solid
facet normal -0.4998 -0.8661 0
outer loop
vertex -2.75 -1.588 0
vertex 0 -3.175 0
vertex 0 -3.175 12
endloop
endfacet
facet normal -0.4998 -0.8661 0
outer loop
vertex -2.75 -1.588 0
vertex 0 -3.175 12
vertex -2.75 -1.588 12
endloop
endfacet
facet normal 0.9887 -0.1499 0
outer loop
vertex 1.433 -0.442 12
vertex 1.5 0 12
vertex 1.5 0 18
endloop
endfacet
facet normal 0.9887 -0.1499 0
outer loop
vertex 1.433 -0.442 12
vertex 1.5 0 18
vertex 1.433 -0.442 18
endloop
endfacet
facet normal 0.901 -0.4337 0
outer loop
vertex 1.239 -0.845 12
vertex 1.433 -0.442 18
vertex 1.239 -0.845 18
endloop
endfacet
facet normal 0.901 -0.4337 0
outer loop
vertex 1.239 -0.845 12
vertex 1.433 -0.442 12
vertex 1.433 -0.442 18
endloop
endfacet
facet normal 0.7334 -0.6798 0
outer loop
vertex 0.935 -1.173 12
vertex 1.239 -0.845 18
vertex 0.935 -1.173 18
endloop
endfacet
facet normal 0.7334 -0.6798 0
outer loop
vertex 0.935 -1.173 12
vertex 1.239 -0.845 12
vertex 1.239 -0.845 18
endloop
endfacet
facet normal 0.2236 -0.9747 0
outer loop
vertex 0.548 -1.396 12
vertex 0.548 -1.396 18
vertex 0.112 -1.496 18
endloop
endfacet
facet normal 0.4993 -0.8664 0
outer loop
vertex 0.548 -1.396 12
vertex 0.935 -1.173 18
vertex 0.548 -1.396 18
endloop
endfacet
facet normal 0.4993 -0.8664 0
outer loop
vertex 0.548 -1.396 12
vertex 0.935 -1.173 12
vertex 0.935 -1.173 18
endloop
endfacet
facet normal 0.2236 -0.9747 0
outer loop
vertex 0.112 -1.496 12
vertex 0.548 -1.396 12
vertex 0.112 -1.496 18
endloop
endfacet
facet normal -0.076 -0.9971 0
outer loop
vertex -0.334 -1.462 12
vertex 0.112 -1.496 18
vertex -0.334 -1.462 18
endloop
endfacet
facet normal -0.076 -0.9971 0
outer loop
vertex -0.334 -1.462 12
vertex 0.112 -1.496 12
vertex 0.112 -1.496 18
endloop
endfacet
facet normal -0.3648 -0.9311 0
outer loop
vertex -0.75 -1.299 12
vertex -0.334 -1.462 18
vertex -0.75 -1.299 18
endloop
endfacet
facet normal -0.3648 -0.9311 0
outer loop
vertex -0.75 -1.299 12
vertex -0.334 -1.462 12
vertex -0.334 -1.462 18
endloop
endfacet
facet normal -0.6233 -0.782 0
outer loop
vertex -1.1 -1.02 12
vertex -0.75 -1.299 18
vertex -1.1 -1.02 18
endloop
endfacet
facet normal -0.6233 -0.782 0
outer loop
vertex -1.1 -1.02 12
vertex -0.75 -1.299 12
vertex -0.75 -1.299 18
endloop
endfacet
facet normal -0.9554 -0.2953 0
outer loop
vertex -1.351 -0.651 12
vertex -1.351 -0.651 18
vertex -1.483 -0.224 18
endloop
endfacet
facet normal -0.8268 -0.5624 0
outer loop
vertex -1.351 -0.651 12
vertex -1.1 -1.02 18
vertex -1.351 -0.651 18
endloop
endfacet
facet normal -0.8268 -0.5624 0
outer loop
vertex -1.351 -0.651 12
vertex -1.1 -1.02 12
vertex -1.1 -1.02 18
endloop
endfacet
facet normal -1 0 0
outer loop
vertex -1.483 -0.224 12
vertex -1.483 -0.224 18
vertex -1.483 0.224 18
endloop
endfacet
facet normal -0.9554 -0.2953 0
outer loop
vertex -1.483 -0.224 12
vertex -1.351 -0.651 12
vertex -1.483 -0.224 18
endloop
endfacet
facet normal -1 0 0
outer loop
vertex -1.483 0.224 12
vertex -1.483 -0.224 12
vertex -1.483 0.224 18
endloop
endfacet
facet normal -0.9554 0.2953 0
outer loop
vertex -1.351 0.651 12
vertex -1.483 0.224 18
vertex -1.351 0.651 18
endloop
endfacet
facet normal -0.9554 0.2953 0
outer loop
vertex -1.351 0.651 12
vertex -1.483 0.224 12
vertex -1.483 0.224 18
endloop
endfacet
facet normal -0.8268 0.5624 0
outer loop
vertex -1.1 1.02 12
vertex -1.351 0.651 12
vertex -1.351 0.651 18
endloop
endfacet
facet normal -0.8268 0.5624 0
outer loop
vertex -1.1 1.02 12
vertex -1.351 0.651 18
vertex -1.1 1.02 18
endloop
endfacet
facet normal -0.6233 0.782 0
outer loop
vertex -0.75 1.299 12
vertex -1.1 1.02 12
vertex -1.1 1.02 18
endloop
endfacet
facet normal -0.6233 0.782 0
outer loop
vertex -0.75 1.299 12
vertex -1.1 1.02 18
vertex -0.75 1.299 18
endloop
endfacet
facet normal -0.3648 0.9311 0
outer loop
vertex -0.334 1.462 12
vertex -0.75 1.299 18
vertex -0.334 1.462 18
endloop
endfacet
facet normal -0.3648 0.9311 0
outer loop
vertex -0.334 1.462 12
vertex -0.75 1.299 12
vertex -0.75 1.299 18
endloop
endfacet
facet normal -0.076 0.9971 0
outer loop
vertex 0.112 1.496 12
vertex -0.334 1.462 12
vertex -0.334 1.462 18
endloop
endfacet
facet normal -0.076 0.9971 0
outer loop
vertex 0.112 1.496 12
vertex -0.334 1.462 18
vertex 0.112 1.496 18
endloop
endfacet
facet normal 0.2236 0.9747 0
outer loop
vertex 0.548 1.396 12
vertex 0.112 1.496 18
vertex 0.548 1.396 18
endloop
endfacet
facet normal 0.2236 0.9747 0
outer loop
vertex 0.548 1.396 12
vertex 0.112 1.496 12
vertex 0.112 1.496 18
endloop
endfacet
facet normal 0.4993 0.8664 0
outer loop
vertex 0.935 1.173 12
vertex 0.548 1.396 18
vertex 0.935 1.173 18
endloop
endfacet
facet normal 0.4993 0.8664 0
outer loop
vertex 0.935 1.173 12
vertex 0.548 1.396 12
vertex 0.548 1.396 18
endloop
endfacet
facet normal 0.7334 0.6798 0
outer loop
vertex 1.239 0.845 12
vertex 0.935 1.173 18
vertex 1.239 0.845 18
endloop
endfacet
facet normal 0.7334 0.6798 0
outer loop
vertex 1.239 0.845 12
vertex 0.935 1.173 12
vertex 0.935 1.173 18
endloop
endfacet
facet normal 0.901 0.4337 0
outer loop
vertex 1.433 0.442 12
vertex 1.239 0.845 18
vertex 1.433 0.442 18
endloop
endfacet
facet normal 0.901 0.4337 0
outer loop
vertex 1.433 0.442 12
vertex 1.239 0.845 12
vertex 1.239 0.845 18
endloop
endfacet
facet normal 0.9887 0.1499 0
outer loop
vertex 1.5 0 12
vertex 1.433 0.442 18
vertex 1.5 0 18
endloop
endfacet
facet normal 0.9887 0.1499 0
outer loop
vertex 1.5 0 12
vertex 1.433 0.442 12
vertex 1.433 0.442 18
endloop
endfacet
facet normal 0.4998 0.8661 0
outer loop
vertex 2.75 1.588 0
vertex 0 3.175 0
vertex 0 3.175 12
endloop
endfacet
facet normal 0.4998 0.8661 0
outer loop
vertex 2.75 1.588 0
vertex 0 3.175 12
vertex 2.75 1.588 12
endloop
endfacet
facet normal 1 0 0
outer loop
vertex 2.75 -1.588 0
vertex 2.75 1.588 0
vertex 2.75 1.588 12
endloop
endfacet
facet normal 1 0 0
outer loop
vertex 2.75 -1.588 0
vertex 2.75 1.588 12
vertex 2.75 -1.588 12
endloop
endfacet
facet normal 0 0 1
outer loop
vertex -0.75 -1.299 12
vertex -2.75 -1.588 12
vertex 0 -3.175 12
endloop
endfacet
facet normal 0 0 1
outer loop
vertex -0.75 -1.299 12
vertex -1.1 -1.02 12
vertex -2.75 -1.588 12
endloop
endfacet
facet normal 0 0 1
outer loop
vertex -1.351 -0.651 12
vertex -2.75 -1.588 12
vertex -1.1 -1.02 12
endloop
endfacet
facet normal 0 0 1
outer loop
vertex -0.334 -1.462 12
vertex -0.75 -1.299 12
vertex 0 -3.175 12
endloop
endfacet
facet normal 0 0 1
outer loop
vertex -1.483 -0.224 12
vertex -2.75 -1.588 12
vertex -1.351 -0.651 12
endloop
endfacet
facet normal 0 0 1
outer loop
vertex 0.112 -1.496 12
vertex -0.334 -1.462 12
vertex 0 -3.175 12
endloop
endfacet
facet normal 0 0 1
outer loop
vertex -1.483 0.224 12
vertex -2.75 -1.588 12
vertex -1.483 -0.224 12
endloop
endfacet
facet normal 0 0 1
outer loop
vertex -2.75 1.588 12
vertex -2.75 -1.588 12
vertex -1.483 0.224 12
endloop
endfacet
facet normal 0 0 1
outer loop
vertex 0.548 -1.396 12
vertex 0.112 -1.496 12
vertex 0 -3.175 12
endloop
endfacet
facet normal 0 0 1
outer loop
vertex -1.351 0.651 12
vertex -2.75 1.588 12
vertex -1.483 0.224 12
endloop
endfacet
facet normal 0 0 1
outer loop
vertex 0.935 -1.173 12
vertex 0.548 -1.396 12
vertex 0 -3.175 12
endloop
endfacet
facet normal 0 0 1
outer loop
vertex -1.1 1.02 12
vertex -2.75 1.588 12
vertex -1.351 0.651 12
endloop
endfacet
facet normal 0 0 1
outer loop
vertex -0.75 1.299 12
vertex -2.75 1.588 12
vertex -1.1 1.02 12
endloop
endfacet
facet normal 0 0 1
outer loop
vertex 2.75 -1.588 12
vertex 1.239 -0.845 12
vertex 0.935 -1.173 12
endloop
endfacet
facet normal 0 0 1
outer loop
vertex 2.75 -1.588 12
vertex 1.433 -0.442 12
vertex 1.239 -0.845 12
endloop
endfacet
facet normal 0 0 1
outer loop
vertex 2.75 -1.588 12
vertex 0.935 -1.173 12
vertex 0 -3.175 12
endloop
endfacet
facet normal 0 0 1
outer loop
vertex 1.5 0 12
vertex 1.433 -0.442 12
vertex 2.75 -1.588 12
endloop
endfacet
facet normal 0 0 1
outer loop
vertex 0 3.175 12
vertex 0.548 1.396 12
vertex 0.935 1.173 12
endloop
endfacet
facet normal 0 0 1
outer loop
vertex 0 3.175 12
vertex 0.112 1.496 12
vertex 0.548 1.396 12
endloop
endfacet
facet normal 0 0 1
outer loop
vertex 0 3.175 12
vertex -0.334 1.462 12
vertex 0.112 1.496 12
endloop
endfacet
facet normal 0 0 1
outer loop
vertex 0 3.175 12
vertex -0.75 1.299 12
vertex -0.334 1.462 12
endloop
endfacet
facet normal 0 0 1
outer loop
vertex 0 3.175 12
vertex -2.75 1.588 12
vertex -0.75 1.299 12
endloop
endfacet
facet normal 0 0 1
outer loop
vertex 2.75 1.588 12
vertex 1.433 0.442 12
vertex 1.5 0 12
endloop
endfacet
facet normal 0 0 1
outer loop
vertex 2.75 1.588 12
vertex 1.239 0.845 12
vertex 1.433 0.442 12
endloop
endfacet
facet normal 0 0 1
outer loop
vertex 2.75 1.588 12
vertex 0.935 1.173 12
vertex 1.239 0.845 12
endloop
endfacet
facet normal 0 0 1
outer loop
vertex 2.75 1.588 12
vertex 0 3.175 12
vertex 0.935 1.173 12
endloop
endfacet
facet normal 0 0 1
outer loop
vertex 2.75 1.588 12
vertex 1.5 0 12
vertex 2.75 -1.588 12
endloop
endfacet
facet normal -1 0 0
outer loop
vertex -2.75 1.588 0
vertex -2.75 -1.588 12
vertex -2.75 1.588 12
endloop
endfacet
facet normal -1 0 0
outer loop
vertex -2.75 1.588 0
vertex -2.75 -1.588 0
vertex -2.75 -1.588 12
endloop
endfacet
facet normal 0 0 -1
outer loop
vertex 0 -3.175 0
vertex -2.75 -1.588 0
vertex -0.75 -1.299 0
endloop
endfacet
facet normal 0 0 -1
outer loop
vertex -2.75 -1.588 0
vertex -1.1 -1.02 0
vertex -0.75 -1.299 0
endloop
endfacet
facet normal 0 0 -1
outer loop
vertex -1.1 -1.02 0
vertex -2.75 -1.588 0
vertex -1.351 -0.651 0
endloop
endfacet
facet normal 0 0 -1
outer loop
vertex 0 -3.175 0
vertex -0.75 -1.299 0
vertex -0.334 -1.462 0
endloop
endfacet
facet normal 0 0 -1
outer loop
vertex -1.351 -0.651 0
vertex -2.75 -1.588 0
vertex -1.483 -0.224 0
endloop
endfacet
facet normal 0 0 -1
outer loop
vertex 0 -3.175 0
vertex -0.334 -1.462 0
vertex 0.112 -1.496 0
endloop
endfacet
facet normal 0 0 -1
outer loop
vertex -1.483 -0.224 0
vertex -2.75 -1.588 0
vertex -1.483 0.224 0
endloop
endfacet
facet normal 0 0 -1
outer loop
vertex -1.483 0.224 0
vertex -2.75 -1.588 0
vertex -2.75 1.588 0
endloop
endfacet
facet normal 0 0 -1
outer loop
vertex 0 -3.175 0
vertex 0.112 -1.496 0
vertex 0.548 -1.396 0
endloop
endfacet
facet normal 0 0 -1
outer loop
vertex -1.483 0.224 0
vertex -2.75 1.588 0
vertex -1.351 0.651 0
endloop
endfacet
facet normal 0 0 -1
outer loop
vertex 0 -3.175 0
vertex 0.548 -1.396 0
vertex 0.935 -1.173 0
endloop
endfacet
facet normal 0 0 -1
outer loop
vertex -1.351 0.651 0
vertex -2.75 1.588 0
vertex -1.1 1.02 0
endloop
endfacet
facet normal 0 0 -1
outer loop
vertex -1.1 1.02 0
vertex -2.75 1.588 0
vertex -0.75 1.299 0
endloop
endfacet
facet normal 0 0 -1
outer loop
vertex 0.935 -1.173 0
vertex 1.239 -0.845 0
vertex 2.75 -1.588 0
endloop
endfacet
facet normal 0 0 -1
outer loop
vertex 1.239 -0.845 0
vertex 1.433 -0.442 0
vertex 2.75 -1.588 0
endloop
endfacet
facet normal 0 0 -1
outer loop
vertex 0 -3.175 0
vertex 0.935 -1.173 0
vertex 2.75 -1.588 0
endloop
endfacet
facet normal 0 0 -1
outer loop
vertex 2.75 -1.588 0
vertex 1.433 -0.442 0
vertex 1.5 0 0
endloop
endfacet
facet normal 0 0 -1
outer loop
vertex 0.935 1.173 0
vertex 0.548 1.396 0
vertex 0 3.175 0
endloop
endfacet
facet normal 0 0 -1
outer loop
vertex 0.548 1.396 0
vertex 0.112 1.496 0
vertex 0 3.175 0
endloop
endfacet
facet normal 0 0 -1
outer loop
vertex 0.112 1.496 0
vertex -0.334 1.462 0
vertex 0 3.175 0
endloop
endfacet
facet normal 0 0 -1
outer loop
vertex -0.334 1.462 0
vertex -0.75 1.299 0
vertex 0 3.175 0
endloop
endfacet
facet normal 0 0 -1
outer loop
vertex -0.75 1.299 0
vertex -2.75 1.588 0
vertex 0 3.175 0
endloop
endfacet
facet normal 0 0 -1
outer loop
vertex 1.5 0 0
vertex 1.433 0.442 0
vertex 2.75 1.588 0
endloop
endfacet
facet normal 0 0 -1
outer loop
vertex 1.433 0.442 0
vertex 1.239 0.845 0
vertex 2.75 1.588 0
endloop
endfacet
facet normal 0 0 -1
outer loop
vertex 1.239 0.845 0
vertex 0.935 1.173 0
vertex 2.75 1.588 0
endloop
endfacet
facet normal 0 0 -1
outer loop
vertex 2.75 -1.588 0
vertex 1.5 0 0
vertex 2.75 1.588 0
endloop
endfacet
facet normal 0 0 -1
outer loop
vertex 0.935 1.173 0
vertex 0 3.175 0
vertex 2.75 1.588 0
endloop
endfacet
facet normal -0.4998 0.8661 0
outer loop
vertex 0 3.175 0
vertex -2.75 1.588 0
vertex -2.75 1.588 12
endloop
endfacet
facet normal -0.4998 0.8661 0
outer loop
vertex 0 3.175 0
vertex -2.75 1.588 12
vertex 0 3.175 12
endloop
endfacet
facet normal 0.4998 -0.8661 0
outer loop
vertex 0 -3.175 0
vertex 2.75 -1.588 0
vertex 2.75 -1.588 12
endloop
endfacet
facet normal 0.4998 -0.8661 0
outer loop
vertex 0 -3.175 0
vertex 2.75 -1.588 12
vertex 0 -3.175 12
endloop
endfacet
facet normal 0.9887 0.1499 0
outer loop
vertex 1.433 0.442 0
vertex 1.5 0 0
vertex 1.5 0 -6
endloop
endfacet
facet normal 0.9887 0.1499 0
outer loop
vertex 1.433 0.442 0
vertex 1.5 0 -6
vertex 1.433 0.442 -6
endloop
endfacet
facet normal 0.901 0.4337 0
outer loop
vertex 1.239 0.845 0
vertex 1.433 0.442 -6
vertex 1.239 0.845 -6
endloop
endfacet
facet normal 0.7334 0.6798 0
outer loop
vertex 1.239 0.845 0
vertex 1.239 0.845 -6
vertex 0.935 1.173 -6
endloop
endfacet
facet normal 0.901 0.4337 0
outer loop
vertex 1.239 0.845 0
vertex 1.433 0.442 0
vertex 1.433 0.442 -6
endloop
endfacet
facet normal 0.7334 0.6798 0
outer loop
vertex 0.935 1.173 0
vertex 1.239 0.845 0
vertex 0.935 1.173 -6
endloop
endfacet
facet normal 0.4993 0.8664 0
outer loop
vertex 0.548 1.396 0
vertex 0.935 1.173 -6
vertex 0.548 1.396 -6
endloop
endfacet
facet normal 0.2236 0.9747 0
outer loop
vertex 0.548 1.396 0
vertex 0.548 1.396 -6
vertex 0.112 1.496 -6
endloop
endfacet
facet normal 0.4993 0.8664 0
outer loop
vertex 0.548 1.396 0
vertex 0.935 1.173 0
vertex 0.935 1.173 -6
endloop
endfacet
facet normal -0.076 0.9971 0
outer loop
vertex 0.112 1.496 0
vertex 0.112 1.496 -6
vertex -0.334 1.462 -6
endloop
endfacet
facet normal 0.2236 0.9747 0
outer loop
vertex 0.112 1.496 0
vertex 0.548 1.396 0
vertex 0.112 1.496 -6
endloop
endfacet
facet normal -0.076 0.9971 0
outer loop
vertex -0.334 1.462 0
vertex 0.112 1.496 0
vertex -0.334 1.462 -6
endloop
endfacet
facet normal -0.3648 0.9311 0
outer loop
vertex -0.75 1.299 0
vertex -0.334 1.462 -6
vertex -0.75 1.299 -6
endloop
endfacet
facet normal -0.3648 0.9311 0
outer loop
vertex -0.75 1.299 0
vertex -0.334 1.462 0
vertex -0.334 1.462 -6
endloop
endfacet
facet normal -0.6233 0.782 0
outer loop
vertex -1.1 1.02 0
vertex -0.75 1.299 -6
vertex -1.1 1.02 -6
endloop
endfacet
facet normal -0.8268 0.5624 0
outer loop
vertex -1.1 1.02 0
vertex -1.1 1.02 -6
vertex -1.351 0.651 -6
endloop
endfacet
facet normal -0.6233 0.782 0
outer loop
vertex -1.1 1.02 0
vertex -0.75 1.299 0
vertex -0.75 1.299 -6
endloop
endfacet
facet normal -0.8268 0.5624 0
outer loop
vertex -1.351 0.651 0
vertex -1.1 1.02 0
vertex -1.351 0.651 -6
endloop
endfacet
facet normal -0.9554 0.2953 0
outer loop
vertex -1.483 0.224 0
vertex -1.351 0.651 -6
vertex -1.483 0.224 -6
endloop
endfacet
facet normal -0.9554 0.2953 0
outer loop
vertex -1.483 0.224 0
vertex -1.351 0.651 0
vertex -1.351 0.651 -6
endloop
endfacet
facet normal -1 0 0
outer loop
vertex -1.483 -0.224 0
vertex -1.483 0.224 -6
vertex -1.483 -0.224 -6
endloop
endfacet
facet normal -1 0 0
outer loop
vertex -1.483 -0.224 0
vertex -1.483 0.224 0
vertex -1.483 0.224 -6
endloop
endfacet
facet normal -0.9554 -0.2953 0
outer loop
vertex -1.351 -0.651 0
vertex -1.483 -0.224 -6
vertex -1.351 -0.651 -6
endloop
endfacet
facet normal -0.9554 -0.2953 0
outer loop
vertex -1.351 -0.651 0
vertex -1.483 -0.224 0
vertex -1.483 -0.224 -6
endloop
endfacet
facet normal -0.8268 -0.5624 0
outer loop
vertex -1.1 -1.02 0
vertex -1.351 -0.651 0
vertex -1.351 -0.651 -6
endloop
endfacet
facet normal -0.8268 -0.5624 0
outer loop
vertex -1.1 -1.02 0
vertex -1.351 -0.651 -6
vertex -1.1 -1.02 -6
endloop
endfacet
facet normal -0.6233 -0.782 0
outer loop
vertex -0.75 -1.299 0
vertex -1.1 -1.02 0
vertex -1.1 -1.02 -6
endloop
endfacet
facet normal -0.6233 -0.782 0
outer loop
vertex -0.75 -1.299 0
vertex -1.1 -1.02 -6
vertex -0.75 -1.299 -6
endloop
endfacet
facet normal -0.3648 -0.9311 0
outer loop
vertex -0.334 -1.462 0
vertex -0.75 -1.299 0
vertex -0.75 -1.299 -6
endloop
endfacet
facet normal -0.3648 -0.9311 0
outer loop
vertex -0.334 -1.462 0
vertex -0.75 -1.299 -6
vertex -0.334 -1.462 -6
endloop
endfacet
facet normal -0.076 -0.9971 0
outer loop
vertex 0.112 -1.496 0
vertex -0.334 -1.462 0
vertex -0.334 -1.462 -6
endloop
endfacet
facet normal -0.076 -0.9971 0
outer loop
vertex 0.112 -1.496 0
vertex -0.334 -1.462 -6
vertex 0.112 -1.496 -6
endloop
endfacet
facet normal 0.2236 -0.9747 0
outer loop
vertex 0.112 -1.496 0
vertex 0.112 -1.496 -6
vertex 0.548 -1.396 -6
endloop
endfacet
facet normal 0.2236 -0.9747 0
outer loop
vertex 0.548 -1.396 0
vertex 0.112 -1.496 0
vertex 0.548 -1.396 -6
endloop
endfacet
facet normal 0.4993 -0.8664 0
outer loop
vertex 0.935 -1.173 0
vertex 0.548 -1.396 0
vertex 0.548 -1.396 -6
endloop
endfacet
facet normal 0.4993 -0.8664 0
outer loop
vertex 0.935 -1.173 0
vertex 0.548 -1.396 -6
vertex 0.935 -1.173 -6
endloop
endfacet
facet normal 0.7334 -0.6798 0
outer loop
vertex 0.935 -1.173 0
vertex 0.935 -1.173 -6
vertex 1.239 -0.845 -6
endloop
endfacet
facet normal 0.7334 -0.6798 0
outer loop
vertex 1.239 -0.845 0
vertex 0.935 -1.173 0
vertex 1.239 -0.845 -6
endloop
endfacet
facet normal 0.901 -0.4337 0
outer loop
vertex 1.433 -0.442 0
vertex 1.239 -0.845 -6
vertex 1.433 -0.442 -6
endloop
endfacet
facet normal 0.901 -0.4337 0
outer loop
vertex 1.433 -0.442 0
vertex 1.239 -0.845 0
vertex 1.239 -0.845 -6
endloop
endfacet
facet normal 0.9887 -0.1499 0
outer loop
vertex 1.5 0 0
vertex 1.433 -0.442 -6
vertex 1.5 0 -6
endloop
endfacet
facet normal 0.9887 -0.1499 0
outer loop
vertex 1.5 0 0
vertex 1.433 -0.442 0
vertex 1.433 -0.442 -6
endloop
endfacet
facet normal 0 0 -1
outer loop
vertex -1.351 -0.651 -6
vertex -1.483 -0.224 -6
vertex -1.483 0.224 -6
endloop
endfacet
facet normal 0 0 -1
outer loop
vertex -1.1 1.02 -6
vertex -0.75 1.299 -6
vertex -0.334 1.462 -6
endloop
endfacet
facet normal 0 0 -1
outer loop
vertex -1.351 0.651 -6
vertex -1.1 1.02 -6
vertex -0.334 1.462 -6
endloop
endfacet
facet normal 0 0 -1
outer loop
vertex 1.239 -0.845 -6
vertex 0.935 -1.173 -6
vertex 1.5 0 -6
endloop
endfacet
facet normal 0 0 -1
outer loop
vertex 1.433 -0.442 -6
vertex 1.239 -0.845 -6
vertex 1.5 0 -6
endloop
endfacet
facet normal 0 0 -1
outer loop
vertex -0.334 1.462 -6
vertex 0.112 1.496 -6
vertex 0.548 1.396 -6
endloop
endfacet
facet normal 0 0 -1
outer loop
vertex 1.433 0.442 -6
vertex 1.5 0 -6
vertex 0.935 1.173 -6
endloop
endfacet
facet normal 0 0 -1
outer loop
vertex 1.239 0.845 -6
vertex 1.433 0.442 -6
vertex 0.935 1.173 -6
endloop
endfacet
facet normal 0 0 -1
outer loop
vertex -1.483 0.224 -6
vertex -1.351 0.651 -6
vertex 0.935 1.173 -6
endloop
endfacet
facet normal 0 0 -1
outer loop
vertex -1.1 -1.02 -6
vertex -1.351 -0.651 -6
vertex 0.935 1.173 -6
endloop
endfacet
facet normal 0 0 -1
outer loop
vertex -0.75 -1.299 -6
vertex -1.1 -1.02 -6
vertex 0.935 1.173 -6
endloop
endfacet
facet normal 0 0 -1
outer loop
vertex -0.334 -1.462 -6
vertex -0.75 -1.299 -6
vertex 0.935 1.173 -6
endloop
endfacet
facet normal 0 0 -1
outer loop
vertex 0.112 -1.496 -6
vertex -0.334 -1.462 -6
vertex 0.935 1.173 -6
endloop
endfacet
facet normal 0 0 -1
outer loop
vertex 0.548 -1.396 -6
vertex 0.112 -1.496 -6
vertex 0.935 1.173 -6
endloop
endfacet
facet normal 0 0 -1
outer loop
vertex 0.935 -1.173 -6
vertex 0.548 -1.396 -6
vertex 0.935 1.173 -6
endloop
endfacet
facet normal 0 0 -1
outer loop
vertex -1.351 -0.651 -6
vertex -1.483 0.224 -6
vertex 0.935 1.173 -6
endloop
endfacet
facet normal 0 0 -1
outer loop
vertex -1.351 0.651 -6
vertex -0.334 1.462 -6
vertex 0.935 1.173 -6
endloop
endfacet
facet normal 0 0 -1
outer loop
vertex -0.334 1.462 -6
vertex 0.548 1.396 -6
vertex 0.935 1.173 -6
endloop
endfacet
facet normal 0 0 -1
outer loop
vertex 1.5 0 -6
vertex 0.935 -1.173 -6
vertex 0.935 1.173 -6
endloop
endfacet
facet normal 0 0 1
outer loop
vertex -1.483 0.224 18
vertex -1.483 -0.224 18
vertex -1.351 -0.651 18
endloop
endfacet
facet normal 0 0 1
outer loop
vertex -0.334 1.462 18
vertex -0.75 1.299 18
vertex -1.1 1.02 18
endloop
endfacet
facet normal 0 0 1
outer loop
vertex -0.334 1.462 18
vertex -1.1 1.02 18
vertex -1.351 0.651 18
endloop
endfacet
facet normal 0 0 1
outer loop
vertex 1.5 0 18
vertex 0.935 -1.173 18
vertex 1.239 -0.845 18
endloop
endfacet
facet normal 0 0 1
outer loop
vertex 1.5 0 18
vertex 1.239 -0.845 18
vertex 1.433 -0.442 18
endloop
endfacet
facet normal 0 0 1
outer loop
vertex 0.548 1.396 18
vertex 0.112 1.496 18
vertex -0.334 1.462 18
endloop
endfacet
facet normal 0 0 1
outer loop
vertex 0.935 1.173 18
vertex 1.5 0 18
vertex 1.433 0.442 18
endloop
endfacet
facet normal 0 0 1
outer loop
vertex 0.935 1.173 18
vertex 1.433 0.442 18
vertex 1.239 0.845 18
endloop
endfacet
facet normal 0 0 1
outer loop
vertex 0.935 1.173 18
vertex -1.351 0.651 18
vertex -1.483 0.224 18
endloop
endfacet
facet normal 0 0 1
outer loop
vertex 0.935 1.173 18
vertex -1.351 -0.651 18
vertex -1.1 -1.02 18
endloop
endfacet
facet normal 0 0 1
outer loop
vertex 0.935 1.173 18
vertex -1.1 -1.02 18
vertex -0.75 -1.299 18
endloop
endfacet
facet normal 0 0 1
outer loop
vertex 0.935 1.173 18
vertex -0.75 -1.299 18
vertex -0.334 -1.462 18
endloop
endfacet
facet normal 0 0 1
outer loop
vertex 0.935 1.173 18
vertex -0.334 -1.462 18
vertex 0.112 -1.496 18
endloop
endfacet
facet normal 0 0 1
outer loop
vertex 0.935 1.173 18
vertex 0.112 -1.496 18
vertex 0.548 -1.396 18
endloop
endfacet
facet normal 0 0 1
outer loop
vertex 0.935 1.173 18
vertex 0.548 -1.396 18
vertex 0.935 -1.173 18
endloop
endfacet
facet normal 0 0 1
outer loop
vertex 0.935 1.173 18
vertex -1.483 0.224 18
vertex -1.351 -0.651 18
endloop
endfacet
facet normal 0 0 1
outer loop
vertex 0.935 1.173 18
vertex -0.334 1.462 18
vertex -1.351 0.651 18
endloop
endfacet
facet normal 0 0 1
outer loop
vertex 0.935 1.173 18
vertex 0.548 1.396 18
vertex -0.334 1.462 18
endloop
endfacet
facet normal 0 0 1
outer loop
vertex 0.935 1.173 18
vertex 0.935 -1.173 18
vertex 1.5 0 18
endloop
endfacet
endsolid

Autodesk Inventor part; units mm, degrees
ref_plane "YZ Plane" through (0, 0, 0) normal (1, 0, 0) x (0, 1, 0)
ref_plane "XZ Plane" through (0, 0, 0) normal (0, 1, 0) x (-1, 0, 0)
ref_plane "XY Plane" through (0, 0, 0) normal (0, 0, 1) x (1, 0, 0)
sketch "スケッチ1" plane through (0, 0, 0) normal (0, 0, 1) x (1, 0, 0)
  line L0 (-2.75, 1.5877) -> (0, 3.1754)
  line L1 (0, 3.1754) -> (2.75, 1.5877)
  line L2 (2.75, 1.5877) -> (2.75, -1.5877)
  line L3 (2.75, -1.5877) -> (0, -3.1754)
  line L4 (0, -3.1754) -> (-2.75, -1.5877)
  line L5 (-2.75, -1.5877) -> (-2.75, 1.5877)
  circle A0 centre (0, 0) radius 1.5
  dimension "d0" = 5.5
  dimension "d1" = 3
extrude "押し出し1" add sketch "スケッチ1" along normal blind 12 contours L0 L1 L2 L3 L4 L5 | A0
sketch "スケッチ2" plane through (0, 0, 12) normal (0, 0, 1) x (1, 0, 0)
  circle A0 centre (0, 0) radius 1.5
  dimension "d4" = 3
extrude "押し出し2" add sketch "スケッチ2" along normal blind 6
extrude "押し出し3" add sketch "スケッチ1" against normal blind 6 contours A0
properties part number "スペーサー　両雄ねじ　m3-12" material "アルミニウム 2014-T4"
